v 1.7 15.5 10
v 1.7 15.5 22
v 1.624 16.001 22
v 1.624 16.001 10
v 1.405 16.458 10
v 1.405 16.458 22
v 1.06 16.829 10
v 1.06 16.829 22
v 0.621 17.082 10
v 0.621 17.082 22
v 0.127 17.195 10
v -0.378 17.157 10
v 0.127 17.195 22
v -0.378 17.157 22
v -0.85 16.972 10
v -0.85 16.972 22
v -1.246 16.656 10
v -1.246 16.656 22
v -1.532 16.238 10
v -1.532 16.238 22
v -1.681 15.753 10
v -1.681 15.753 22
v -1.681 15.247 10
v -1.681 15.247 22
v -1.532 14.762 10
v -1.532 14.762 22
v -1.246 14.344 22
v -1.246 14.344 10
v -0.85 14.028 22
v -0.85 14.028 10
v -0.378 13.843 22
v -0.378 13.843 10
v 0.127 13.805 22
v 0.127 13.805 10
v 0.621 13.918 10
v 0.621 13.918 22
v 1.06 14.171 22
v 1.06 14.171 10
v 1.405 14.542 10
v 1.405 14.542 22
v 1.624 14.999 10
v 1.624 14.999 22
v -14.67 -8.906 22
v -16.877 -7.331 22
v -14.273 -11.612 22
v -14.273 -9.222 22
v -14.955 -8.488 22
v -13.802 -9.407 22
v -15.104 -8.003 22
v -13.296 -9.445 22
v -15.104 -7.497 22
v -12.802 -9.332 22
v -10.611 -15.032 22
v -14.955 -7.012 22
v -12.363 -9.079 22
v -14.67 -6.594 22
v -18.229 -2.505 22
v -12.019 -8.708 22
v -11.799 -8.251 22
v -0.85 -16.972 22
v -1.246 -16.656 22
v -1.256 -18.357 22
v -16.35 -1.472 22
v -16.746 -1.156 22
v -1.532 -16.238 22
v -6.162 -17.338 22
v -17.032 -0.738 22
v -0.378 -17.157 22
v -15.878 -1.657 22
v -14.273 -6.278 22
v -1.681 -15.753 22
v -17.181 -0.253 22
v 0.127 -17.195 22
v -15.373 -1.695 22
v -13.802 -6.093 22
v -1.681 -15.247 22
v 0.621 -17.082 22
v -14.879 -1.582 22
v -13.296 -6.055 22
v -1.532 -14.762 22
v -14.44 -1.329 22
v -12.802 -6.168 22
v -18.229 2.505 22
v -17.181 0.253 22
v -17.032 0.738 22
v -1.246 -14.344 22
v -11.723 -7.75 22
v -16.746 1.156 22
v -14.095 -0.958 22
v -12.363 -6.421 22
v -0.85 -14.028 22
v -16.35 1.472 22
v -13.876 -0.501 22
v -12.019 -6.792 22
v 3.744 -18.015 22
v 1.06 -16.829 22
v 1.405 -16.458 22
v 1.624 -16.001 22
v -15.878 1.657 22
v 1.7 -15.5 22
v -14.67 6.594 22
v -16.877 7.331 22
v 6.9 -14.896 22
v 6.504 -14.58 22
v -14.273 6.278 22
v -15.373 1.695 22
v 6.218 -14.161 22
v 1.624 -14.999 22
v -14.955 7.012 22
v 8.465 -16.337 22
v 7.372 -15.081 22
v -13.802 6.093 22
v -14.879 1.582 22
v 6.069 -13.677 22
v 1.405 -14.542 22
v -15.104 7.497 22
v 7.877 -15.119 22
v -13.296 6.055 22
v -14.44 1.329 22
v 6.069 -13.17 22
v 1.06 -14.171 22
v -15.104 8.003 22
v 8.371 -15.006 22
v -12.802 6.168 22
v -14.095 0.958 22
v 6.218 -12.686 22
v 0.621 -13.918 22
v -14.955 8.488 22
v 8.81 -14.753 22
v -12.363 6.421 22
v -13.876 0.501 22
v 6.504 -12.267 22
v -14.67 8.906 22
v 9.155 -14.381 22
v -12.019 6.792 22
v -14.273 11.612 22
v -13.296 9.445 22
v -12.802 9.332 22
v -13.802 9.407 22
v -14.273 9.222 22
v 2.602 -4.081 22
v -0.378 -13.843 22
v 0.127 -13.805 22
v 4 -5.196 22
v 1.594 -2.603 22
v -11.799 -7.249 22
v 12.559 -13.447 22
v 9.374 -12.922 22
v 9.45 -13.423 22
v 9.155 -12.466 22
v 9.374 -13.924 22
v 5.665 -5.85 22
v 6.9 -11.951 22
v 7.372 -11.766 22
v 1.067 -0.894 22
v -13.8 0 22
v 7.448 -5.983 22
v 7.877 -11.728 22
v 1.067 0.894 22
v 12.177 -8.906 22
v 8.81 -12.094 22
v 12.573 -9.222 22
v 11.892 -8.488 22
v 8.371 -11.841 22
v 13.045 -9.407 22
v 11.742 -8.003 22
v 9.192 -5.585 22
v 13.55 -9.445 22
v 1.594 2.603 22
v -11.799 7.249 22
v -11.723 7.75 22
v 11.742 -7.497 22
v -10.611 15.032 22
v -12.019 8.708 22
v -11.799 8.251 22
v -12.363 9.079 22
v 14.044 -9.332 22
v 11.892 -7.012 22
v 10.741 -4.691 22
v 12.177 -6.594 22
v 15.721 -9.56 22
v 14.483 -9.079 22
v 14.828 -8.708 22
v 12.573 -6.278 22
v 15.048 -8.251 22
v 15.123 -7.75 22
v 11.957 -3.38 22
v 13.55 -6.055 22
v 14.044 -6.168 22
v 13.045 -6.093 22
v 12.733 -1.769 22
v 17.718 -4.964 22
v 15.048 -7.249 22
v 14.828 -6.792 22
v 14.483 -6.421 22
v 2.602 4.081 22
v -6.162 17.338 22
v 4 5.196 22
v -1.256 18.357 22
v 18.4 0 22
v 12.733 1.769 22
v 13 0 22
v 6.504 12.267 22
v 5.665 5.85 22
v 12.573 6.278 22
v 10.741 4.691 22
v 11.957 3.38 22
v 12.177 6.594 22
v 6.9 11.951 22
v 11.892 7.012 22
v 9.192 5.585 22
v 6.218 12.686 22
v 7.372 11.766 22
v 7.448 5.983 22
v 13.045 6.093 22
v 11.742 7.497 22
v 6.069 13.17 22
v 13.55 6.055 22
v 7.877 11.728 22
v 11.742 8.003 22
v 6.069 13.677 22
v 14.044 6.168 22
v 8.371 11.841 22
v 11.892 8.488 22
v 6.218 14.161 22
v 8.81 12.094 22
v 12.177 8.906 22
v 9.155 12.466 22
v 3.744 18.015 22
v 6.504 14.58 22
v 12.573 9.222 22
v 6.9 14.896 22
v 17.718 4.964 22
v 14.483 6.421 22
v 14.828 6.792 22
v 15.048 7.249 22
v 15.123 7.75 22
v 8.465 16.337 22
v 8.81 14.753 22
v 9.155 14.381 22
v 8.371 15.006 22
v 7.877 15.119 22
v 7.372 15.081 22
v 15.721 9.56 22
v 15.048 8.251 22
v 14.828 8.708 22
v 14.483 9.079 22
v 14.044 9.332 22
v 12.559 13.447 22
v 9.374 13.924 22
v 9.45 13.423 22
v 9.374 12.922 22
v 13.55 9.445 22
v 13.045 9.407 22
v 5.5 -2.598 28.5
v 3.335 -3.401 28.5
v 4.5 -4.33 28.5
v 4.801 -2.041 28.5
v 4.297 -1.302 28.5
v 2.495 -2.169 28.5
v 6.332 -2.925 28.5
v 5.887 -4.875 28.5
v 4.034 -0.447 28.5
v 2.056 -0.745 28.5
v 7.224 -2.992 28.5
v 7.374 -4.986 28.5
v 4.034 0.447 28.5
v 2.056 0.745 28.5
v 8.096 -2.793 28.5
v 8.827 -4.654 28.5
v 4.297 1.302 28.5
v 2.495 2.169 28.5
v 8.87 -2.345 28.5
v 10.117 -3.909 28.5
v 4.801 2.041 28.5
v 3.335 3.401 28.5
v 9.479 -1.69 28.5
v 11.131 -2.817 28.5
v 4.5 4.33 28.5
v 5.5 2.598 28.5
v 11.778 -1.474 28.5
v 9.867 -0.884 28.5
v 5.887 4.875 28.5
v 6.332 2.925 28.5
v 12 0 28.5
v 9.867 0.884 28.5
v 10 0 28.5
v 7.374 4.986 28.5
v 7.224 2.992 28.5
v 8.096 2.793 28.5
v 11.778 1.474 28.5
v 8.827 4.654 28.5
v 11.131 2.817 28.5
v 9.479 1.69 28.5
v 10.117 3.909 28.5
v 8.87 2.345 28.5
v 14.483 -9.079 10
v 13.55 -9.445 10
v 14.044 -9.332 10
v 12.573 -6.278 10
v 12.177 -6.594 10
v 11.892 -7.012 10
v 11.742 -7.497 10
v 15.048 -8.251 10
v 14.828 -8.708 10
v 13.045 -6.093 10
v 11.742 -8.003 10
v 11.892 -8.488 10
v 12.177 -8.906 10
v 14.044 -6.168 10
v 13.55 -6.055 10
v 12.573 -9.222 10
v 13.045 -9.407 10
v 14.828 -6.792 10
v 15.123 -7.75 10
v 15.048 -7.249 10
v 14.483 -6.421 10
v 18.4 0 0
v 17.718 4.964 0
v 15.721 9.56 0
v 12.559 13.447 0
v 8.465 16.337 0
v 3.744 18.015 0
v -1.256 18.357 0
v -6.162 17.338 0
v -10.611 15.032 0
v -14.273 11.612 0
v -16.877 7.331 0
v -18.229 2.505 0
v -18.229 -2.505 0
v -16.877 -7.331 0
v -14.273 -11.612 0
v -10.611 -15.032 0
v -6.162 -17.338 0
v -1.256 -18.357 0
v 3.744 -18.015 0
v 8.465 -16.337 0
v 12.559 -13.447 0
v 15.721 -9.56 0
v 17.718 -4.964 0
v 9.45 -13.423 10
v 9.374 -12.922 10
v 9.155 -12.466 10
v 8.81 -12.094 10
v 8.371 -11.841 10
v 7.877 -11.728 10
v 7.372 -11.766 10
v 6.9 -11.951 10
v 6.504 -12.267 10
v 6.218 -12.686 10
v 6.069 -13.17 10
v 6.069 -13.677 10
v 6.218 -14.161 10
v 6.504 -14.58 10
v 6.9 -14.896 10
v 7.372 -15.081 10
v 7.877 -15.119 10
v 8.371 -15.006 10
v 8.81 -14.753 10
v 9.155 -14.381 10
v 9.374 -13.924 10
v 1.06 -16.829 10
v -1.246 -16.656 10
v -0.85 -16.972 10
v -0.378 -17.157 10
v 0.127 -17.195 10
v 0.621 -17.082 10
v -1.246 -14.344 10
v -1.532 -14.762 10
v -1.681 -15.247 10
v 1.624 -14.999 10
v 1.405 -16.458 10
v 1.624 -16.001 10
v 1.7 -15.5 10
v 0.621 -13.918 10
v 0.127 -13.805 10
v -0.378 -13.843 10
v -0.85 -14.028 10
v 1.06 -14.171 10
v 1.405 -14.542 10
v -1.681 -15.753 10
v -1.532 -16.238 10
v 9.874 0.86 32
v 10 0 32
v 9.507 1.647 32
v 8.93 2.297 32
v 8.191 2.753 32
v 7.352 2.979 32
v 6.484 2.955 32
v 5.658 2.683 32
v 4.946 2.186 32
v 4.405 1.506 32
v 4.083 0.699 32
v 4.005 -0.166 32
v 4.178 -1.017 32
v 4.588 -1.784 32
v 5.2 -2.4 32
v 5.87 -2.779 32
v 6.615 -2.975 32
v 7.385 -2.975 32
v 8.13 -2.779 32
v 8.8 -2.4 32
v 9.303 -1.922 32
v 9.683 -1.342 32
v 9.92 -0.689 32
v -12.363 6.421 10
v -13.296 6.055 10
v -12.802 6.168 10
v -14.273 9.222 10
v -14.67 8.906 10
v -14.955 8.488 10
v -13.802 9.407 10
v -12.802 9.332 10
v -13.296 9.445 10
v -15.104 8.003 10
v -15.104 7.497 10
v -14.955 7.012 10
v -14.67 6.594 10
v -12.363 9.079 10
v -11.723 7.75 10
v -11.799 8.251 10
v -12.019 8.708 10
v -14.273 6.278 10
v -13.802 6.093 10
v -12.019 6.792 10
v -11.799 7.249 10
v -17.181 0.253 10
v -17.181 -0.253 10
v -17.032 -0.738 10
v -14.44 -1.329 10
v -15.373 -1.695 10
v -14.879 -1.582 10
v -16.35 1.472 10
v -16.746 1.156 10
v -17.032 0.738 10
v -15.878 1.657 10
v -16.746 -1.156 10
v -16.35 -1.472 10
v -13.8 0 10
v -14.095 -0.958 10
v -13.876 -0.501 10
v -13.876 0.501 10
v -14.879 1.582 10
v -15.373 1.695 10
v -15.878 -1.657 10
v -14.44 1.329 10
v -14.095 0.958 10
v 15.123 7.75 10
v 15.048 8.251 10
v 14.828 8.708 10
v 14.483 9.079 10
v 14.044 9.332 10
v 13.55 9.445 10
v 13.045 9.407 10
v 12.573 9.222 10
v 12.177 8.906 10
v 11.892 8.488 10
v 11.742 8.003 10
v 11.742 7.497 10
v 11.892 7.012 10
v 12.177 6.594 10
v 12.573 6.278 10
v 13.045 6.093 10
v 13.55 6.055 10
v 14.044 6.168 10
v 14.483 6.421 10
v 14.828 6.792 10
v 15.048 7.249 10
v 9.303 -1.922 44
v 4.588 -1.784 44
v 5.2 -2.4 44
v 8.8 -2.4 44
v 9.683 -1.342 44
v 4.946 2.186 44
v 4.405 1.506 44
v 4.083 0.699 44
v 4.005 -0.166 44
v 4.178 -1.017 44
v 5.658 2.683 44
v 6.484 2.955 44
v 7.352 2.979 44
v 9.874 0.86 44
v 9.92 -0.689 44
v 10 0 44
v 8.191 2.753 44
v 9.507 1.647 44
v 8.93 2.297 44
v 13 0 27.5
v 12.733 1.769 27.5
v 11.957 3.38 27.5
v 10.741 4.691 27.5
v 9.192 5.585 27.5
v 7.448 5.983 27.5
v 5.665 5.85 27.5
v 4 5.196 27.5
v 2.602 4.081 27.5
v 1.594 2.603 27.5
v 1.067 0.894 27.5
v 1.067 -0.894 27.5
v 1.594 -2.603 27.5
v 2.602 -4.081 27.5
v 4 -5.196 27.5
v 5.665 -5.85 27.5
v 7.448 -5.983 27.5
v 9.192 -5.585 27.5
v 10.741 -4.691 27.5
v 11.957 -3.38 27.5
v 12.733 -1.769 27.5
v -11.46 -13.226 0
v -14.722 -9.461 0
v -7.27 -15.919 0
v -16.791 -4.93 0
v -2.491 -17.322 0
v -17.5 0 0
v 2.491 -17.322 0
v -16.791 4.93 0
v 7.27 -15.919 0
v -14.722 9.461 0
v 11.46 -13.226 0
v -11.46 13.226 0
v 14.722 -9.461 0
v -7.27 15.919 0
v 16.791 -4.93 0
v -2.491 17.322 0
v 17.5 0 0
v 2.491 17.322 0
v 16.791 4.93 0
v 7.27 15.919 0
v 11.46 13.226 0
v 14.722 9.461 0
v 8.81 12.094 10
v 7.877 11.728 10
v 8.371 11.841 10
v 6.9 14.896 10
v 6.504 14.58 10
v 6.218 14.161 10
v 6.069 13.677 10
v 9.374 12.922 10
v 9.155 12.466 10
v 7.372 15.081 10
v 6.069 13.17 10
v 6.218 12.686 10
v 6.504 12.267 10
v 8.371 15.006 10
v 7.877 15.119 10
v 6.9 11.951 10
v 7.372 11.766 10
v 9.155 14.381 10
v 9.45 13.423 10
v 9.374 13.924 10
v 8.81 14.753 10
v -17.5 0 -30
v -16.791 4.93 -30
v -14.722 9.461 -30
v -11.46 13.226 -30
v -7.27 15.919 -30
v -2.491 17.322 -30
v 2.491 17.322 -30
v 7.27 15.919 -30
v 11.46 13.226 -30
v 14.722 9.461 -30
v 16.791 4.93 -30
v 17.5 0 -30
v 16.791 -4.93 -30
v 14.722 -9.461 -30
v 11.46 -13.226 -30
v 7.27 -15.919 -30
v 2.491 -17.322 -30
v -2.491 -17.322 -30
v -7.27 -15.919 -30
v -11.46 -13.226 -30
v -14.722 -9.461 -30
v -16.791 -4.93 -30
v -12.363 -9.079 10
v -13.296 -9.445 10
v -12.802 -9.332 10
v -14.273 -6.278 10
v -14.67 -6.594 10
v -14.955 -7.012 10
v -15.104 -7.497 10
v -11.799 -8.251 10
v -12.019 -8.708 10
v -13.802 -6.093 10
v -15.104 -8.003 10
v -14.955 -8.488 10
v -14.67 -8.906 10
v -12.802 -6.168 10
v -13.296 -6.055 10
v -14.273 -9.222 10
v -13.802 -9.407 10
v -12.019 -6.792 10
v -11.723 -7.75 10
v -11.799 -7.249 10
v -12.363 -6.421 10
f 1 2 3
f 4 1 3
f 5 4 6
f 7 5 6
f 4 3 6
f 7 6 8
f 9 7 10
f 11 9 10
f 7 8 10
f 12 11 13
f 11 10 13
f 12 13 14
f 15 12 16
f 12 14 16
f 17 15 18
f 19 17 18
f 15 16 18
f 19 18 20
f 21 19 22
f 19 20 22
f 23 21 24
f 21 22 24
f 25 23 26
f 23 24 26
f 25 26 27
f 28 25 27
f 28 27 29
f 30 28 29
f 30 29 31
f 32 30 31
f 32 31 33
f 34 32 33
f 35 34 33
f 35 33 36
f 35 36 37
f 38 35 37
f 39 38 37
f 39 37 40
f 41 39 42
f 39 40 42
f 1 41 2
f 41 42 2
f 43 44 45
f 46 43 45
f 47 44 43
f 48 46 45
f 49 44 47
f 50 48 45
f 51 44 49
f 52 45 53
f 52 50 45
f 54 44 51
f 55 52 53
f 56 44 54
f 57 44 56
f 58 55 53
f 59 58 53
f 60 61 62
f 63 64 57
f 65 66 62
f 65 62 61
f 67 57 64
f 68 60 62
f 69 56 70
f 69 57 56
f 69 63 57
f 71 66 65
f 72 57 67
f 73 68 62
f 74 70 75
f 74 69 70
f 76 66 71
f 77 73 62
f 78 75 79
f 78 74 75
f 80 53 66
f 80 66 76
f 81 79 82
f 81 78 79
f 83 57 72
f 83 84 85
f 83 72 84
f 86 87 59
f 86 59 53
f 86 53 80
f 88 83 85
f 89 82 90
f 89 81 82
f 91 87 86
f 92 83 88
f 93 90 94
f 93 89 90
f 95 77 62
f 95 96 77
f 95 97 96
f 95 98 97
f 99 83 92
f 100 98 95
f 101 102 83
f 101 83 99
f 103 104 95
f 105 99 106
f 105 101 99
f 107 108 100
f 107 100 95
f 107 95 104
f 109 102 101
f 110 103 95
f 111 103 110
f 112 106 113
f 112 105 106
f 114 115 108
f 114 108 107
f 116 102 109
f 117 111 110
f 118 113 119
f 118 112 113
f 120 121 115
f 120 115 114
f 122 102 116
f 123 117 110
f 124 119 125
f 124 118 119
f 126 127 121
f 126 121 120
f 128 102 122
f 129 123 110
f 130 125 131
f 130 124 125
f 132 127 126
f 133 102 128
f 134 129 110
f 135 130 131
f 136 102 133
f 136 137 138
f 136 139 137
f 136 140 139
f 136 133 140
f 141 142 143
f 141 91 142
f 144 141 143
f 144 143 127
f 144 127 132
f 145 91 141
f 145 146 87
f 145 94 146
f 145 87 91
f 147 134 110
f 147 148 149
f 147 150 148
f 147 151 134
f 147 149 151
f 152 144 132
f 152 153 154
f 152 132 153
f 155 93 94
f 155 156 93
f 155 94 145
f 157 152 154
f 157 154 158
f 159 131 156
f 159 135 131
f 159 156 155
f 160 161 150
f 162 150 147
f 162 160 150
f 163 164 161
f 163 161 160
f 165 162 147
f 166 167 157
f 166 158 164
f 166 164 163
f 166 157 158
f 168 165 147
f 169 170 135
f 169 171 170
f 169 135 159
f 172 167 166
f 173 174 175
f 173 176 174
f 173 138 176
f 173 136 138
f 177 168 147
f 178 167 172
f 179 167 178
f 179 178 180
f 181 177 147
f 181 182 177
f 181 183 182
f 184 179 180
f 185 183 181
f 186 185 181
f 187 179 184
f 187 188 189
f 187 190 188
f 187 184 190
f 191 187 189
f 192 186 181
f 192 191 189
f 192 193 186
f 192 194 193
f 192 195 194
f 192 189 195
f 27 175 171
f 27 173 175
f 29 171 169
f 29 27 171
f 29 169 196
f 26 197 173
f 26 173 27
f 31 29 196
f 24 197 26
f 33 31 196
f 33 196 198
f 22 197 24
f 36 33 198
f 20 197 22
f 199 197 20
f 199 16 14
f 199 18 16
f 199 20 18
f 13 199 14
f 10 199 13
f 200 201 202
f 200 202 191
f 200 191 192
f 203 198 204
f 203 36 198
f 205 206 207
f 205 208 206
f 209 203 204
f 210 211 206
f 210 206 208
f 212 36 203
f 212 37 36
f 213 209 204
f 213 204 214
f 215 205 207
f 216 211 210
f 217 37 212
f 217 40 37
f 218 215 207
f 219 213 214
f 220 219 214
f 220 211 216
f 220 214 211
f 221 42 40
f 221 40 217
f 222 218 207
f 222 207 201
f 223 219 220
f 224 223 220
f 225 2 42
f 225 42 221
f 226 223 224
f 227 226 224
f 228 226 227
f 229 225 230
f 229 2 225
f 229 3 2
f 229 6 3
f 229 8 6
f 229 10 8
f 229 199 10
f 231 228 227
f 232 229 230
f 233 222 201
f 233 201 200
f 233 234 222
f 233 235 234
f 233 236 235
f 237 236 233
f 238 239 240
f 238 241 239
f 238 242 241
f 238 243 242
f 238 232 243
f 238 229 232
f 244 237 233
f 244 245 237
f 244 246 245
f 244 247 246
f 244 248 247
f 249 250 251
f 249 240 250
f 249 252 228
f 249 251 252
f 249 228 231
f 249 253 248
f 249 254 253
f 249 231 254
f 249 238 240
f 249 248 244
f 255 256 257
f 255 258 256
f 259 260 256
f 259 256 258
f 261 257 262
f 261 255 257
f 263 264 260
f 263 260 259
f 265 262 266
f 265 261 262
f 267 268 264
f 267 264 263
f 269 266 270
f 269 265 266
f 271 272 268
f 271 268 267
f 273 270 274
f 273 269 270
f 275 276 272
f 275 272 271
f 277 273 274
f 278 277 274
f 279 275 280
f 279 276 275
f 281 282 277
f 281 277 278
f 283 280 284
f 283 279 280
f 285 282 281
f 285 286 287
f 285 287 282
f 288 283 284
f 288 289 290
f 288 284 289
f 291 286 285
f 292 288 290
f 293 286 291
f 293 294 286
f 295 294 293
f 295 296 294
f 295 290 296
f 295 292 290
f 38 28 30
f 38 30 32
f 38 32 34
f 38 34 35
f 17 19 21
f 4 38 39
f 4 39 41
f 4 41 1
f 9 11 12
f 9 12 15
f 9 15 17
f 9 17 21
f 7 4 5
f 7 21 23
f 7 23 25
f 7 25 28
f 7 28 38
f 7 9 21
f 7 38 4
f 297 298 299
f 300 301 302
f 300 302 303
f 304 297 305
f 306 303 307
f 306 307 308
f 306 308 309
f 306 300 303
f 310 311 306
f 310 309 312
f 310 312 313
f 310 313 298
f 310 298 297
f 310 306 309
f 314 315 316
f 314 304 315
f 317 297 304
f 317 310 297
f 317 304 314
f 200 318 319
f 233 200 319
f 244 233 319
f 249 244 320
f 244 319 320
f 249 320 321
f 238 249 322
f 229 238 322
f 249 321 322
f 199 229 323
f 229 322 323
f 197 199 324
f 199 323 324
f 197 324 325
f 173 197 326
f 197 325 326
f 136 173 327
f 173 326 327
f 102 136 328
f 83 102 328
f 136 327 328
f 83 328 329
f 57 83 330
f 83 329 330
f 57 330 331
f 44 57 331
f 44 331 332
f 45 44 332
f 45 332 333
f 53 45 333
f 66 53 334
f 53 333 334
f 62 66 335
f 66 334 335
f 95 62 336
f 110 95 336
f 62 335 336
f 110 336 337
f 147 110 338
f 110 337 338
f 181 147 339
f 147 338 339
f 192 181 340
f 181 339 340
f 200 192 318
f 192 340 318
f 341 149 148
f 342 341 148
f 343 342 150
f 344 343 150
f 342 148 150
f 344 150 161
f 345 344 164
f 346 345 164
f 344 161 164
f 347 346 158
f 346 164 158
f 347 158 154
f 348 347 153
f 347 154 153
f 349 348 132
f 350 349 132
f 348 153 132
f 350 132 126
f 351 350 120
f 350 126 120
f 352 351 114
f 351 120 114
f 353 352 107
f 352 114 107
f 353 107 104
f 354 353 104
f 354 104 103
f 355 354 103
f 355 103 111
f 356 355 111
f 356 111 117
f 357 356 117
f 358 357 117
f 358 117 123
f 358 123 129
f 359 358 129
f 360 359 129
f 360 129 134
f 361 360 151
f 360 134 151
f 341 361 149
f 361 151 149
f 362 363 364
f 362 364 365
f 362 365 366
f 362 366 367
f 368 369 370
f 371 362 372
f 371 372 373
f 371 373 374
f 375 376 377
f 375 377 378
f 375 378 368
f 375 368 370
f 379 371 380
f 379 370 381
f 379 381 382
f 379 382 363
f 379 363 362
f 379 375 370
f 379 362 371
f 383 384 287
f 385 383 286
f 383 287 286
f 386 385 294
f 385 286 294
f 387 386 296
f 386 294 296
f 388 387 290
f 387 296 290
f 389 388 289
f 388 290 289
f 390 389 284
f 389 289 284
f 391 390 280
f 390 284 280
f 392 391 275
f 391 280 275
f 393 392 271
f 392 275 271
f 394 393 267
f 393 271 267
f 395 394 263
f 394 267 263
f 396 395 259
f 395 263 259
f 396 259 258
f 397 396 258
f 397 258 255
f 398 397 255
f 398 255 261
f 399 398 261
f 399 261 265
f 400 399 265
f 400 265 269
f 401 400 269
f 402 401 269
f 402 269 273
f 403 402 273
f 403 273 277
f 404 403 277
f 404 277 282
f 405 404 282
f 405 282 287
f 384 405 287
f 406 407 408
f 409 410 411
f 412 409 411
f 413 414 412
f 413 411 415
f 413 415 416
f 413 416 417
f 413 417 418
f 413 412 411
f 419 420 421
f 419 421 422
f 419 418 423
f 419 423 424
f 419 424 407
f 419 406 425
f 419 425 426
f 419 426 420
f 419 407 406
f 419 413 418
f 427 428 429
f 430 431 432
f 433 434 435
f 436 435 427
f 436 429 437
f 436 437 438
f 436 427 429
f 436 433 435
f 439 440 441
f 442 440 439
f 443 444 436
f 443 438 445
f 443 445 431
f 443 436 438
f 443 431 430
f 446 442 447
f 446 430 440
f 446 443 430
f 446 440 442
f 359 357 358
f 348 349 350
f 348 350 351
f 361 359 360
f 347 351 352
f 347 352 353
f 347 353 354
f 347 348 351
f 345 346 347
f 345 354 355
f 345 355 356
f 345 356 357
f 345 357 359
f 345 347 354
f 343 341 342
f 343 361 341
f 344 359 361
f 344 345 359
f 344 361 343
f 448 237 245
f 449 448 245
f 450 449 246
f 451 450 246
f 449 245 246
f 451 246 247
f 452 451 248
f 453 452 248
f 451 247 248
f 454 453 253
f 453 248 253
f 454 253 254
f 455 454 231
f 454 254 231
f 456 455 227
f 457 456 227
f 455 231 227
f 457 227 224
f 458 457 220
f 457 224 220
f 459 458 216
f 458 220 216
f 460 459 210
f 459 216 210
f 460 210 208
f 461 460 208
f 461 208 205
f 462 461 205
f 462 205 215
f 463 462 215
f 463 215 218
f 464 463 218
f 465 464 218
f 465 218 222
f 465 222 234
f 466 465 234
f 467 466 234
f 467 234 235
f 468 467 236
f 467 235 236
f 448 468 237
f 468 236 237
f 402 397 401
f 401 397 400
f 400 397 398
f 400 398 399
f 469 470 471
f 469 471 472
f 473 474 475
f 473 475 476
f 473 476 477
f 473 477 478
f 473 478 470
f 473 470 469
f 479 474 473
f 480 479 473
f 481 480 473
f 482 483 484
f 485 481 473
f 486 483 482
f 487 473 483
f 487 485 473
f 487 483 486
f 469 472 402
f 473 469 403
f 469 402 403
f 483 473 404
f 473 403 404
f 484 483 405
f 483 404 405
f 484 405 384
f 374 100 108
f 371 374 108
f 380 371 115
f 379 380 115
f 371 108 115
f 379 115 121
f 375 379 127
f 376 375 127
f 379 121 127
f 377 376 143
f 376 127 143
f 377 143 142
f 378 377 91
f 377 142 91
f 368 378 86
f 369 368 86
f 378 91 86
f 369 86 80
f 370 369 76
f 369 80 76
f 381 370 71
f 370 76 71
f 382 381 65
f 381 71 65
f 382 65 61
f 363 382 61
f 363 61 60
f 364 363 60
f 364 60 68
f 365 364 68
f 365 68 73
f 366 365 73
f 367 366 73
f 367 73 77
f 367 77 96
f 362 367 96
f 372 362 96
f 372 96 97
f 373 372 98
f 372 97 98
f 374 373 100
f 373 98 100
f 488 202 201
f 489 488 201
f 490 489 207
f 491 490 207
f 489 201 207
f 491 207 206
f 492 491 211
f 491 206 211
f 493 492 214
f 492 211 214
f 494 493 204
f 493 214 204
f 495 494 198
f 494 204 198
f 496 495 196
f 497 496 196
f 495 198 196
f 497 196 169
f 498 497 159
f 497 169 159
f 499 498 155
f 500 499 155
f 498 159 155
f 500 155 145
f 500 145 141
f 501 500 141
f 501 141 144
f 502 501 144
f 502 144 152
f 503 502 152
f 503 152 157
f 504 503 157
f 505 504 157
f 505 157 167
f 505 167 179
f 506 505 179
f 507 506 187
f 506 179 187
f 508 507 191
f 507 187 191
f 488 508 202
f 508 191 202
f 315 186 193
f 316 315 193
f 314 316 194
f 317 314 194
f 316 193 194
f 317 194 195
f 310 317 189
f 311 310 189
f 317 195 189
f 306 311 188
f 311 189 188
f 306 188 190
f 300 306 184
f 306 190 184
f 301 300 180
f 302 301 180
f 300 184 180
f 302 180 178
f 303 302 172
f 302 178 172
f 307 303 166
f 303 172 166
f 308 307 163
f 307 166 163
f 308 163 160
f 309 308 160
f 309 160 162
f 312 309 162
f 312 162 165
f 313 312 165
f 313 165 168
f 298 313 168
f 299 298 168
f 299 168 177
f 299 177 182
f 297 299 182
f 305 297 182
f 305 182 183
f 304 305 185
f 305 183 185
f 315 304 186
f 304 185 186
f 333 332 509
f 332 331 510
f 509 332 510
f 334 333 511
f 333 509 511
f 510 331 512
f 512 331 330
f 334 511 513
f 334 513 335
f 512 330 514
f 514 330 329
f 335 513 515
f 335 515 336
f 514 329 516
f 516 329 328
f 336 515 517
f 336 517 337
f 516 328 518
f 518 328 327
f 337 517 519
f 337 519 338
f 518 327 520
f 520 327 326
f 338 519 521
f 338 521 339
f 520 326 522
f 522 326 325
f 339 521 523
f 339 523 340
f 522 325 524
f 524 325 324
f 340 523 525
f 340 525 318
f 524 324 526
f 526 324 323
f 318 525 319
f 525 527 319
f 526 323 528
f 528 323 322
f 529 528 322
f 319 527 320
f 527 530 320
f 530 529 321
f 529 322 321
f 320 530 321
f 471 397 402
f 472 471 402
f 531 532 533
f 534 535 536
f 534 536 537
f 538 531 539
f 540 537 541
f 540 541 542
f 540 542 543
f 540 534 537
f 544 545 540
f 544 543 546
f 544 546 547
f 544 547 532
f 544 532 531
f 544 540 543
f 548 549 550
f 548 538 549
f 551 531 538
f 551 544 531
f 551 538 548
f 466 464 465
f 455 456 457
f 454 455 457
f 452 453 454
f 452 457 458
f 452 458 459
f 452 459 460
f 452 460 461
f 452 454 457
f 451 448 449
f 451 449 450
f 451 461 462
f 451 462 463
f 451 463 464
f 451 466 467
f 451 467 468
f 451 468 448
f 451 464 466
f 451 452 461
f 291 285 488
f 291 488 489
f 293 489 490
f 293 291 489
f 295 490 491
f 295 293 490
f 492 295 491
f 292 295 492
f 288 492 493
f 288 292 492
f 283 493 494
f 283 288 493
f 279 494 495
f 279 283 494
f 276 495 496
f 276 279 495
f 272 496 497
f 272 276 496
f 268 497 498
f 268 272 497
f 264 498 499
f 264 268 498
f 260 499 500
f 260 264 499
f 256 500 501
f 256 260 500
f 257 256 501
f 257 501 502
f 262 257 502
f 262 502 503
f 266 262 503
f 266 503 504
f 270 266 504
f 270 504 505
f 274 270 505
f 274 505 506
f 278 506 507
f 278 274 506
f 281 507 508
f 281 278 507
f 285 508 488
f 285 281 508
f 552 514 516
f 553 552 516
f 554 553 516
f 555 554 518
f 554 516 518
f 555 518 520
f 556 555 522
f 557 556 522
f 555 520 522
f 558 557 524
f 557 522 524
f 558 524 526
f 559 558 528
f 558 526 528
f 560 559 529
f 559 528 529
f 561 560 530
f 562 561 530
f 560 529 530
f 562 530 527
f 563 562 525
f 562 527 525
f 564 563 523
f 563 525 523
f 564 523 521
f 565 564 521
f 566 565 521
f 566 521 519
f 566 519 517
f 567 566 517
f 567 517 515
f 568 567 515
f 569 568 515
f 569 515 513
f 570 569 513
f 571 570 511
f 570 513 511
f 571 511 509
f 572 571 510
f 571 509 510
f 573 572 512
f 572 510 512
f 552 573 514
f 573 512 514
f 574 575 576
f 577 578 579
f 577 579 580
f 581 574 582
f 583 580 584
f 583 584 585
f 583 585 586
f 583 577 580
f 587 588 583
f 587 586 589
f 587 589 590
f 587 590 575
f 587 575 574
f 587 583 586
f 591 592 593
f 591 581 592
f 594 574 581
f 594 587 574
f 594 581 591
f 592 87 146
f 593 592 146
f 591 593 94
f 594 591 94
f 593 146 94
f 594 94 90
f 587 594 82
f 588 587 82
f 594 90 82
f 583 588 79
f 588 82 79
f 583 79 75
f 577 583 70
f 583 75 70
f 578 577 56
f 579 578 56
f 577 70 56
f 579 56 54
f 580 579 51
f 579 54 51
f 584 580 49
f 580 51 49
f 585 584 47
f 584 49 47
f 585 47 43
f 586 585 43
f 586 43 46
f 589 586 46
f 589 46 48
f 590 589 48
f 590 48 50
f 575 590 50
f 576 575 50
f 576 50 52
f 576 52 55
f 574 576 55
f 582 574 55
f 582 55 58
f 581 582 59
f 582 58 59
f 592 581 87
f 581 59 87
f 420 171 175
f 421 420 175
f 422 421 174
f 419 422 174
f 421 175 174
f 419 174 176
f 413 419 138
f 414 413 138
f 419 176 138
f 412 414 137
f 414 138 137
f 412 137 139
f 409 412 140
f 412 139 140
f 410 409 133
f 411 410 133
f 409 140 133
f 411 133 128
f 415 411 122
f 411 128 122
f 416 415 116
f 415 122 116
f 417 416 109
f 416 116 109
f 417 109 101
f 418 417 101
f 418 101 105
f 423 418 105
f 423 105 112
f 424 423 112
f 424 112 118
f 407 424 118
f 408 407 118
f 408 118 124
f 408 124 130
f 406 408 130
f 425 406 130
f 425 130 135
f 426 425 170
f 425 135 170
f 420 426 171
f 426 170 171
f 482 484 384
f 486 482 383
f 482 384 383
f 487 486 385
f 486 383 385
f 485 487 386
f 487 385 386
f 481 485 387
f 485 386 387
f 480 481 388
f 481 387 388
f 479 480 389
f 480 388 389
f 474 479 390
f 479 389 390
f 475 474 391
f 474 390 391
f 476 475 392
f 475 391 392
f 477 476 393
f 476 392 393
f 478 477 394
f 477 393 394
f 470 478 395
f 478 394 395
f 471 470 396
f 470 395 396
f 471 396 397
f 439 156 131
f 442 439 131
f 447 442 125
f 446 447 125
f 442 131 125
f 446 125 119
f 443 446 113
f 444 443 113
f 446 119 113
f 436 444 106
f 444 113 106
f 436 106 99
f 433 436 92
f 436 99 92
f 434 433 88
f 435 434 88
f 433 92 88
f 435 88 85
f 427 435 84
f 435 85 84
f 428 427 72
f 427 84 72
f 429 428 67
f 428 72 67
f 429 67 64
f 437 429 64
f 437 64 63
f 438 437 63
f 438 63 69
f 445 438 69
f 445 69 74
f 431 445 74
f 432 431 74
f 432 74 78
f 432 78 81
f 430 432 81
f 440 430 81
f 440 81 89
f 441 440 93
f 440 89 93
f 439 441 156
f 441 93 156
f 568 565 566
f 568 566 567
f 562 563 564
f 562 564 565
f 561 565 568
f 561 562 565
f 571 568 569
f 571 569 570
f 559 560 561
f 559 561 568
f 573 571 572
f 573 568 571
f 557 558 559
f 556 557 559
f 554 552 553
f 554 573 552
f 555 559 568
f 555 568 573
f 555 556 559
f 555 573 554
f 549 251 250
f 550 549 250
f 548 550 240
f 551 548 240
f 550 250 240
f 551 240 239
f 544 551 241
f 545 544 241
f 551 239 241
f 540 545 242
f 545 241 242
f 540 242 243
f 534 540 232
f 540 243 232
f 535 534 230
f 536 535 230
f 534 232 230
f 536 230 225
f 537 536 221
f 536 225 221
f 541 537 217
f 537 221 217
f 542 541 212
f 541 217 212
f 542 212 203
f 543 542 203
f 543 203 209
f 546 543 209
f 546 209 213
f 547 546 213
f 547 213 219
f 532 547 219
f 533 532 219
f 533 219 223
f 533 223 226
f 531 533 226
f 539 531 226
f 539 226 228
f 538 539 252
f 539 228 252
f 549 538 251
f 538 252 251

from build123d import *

# Parameters (mm, degrees)
SKETCH1_R           = 18.4
BOSS_EXTRUDE1_DEPTH = 22
SKETCH2_R           = 17.5
BOSS_EXTRUDE2_DEPTH = 30
SKETCH3_R           = 6
BOSS_EXTRUDE4_DEPTH = 6.5
CHAMFER1_SIZE       = 1
SKETCH4_R           = 3
BOSS_EXTRUDE5_DEPTH = 3.5
BOSS_EXTRUDE6_DEPTH = 12
SKETCH6_R           = 1.7
CUT_EXTRUDE1_DEPTH  = 12


with BuildPart() as part:
    # Sketch1 → Boss-Extrude1 (new body)
    with BuildSketch(Plane.XY):
        Circle(SKETCH1_R)
    extrude(amount=BOSS_EXTRUDE1_DEPTH)

    # Sketch2 → Boss-Extrude2 (add)
    with BuildSketch(Plane(origin=(0, 0, 0), x_dir=(-1, 0, 0), z_dir=(0, 0, -1))):
        Circle(SKETCH2_R)
    extrude(amount=BOSS_EXTRUDE2_DEPTH)

    # Sketch3 → Boss-Extrude4 (add)
    with BuildSketch(Plane.XY.offset(22)):
        with Locations((7, 0)):
            Circle(SKETCH3_R)
    extrude(amount=BOSS_EXTRUDE4_DEPTH)

    # Chamfer1
    chamfer1_edges = [part.edges().sort_by_distance(p)[0] for p in [
        (1, 0, 28.5),
    ]]
    chamfer(chamfer1_edges, length=CHAMFER1_SIZE)

    # Sketch4 → Boss-Extrude5 (add)
    with BuildSketch(Plane.XY.offset(28.5)):
        with Locations((7, 0)):
            Circle(SKETCH4_R)
    extrude(amount=BOSS_EXTRUDE5_DEPTH)

    # Sketch5 → Boss-Extrude6 (add)
    with BuildSketch(Plane.XY.offset(32)):
        with BuildLine():
            ThreePointArc((10, 0), (5.658359214, 2.683281573), (5.2, -2.4))
            Line((5.2, -2.4), (8.8, -2.4))
            ThreePointArc((8.8, -2.4), (9.683281573, -1.341640786), (10, 0))
        make_face()
    extrude(amount=BOSS_EXTRUDE6_DEPTH)

    # Sketch6 → Cut-Extrude1 (cut)
    with BuildSketch(Plane.XY.offset(22)):
        with Locations((0, 15.5)):
            Circle(SKETCH6_R)
        with Locations((13.423393759, 7.75)):
            Circle(SKETCH6_R)
        with Locations((13.423393759, -7.75)):
            Circle(SKETCH6_R)
        with Locations((0, -15.5)):
            Circle(SKETCH6_R)
        with Locations((-13.423393759, -7.75)):
            Circle(SKETCH6_R)
        with Locations((-13.423393759, 7.75)):
            Circle(SKETCH6_R)
        with Locations((-15.5, 0)):
            Circle(SKETCH6_R)
        with Locations((7.75, 13.423393759)):
            Circle(SKETCH6_R)
        with Locations((7.75, -13.423393759)):
            Circle(SKETCH6_R)
    extrude(amount=-CUT_EXTRUDE1_DEPTH, mode=Mode.SUBTRACT)


solid = part.part
